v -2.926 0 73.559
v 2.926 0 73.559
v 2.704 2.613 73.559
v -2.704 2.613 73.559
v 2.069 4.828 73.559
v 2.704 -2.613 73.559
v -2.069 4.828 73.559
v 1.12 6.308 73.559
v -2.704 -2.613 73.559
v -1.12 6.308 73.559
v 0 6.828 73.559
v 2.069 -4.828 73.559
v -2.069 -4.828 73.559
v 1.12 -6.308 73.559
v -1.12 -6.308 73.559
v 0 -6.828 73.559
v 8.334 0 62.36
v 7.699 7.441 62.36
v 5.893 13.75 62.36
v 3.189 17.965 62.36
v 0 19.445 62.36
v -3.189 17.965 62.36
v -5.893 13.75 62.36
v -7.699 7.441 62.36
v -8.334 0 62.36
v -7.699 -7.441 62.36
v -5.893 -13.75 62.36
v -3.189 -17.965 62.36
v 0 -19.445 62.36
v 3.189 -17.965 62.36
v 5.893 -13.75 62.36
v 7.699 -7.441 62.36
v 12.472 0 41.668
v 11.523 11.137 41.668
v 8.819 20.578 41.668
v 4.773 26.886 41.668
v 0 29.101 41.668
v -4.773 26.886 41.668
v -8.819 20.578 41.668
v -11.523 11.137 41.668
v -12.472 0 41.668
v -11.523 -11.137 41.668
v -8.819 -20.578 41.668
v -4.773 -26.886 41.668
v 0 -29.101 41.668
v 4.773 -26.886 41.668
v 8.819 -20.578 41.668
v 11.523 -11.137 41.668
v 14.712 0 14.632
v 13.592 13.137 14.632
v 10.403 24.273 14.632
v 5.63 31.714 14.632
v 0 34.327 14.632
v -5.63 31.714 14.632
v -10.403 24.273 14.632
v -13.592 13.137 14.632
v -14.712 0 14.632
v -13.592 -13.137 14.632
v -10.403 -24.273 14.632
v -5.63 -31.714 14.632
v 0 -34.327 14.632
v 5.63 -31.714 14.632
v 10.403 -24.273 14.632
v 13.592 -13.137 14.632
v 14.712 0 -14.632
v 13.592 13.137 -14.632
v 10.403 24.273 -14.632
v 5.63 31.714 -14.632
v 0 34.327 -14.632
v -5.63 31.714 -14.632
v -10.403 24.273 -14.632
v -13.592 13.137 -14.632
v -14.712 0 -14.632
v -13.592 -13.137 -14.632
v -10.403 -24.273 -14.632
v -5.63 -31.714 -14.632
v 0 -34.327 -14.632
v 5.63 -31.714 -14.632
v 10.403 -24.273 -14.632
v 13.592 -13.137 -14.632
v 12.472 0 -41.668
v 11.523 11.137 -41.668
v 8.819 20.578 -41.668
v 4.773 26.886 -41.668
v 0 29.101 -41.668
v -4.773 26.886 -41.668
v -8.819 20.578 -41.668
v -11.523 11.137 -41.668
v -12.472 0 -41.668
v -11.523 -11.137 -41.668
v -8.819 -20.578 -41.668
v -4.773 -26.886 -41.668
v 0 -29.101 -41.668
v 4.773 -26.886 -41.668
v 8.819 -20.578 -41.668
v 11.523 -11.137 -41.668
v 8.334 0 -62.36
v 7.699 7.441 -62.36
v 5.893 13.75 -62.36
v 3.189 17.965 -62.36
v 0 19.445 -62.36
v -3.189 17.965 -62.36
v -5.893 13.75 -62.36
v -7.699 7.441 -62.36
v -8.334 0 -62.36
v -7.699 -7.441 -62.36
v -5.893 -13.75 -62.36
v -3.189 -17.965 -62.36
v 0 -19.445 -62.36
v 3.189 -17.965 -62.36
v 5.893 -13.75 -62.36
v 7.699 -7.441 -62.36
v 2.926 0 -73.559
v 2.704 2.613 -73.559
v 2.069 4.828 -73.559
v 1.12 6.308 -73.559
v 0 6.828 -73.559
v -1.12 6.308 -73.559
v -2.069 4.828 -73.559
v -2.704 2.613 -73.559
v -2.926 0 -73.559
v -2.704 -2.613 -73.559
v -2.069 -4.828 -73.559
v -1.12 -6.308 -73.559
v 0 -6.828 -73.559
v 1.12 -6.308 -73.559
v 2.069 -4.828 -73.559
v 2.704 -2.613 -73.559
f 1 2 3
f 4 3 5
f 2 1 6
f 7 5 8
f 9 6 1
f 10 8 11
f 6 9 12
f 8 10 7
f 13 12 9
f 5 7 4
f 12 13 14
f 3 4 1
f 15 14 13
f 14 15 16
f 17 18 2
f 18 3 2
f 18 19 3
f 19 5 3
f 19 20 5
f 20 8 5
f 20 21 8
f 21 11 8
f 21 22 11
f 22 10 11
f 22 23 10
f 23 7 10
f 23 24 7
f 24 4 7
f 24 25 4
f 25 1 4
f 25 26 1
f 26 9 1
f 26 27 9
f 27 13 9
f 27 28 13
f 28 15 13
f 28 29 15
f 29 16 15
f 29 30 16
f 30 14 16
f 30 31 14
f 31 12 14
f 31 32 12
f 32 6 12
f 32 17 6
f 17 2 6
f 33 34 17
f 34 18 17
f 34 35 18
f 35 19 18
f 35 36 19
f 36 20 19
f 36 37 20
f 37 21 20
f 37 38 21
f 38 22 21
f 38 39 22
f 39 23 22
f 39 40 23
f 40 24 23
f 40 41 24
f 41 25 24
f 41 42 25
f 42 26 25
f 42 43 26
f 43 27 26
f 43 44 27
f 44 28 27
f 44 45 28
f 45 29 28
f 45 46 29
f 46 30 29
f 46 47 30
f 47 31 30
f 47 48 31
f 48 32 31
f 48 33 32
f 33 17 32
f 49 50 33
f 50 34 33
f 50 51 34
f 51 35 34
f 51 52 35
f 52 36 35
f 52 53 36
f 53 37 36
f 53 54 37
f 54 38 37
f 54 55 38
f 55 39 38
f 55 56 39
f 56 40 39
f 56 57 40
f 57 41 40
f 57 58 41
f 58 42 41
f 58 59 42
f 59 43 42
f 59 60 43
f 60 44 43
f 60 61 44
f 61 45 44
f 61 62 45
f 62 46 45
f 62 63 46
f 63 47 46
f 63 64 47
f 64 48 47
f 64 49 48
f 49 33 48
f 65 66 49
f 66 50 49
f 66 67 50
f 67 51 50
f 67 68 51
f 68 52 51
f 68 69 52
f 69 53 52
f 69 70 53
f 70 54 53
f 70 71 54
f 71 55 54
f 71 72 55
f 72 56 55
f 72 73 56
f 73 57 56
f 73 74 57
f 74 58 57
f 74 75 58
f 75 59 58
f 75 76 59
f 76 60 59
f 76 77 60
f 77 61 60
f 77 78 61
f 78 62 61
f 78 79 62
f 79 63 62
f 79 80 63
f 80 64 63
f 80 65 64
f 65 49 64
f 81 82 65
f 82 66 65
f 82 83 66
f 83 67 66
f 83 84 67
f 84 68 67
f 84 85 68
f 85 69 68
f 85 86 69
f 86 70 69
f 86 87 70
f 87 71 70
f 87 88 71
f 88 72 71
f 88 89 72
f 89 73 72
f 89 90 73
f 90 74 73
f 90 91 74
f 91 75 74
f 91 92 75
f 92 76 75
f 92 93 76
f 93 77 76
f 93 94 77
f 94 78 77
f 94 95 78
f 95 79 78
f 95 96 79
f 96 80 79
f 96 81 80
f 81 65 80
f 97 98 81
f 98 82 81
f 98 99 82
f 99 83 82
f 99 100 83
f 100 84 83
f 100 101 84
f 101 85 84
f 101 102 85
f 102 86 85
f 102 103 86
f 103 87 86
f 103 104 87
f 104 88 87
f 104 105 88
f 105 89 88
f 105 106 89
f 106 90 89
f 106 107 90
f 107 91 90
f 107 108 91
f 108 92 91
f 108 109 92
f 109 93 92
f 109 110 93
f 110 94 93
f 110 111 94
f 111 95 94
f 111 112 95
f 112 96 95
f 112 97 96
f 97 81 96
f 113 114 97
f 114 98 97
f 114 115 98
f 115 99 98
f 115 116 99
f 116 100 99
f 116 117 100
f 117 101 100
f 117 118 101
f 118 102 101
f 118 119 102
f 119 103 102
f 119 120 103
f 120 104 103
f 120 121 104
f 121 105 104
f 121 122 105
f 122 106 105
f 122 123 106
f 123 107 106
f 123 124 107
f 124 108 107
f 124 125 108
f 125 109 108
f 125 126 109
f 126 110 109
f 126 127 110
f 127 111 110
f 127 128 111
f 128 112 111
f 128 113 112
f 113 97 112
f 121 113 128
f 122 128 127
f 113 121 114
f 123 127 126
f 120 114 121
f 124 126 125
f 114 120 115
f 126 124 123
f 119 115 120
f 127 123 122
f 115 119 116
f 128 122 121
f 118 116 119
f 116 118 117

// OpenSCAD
// Generated by SolidPython 1.0.1 on 2020-07-29 00:46:45


scale(v = [3, 7, 15]) {
	sphere(r = 5);
}
/***********************************************
*********      SolidPython code:      **********
************************************************
 
# import packages: SolidPython
from solid import *
from solid.utils import *
from itertools import chain, combinations, permutations


class Resize:

    def __init__(self, scad_file):
        self.scad_file = scad_file
        #self.scad_file = import_scad(scad_file)
        # cone/cylinder param:
        self.r1 = 0
        self.r2 = 0
        self.h = 0
        # rectangular prism param:
        self.w = 0
        self.l = 0
        # ellipse param:
        self.r = 0

    # import OpenScad code (file name corresponds to shape)


    # classify shape + parameters
    def assign(self, param1, param2, param3):
        if self.scad_file == 'cone.scad':
            self.r1 = param1
            self.r2 = param2
            self.h = param3
        elif self.scad_file == 'cylinder.scad':
            self.r1 = param1
            self.r2 = param2
            self.h = param3
        elif self.scad_file == 'rectangularPrism.scad':
            self.h = param1
            self.l = param2
            self.w = param3
        else:
            self.r = param1
            self.h = param2

    # resize parameters
    def iterate(self):
        x = range(3, 20, 2)
        i = 1
        if self.scad_file == 'cone.scad':
            tempList = list(permutations(x, 2))
            for temp in tempList:
                param1 = temp[0]
                param2 = temp[1]
                filepath = 'produced_scad_files/' + 'cone' + str(param1) + '_' + str(param2) + '_' + '.scad'
                scad_render_to_file(cylinder(h=param1, r1=param2, r2=0), filepath)

        elif self.scad_file == 'cylinder.scad':
            tempList = list(permutations(x, 3))
            for temp in tempList:
                param1 = temp[0]
                param2 = temp[1]
                filepath = 'produced_scad_files/' + 'cylinder' + str(param1) + '_' + str(param2) + '_' + '.scad'
                scad_render_to_file(cylinder(h=param1, r1=param2, r2=param2), filepath)

        elif self.scad_file == 'rectangularPrism.scad':
            tempList = list(permutations(x, 3))
            for temp in tempList:
                param1 = temp[0]
                param2 = temp[1]
                param3 = temp[2]
                filepath = 'produced_scad_files/' + 'rectangularPrism' + str(param1) + '_' + str(param2) + '_' + str(
                    param3) + '.scad'
                scad_render_to_file(cube(size=(param1, param2, param3)), filepath)

        elif self.scad_file == 'ellipse.scad':
            tempList = list(permutations(x, 4))
            for temp in tempList:
                param1 = temp[0]
                param2 = temp[1]
                param3 = temp[2]
                param4 = temp[3]
                filepath = 'produced_scad_files/' + 'ellipse' + str(param1) + '_' + str(param2) + '_' + str(param3) + '_' + str(param4) + '.scad'
                scad_render_to_file(scale([param1, param2, param3])(sphere(r=param4)), filepath)

    def render_to_scadfile(self):
        scad_render_to_file(scad, 'example.scad') 
 
************************************************/
